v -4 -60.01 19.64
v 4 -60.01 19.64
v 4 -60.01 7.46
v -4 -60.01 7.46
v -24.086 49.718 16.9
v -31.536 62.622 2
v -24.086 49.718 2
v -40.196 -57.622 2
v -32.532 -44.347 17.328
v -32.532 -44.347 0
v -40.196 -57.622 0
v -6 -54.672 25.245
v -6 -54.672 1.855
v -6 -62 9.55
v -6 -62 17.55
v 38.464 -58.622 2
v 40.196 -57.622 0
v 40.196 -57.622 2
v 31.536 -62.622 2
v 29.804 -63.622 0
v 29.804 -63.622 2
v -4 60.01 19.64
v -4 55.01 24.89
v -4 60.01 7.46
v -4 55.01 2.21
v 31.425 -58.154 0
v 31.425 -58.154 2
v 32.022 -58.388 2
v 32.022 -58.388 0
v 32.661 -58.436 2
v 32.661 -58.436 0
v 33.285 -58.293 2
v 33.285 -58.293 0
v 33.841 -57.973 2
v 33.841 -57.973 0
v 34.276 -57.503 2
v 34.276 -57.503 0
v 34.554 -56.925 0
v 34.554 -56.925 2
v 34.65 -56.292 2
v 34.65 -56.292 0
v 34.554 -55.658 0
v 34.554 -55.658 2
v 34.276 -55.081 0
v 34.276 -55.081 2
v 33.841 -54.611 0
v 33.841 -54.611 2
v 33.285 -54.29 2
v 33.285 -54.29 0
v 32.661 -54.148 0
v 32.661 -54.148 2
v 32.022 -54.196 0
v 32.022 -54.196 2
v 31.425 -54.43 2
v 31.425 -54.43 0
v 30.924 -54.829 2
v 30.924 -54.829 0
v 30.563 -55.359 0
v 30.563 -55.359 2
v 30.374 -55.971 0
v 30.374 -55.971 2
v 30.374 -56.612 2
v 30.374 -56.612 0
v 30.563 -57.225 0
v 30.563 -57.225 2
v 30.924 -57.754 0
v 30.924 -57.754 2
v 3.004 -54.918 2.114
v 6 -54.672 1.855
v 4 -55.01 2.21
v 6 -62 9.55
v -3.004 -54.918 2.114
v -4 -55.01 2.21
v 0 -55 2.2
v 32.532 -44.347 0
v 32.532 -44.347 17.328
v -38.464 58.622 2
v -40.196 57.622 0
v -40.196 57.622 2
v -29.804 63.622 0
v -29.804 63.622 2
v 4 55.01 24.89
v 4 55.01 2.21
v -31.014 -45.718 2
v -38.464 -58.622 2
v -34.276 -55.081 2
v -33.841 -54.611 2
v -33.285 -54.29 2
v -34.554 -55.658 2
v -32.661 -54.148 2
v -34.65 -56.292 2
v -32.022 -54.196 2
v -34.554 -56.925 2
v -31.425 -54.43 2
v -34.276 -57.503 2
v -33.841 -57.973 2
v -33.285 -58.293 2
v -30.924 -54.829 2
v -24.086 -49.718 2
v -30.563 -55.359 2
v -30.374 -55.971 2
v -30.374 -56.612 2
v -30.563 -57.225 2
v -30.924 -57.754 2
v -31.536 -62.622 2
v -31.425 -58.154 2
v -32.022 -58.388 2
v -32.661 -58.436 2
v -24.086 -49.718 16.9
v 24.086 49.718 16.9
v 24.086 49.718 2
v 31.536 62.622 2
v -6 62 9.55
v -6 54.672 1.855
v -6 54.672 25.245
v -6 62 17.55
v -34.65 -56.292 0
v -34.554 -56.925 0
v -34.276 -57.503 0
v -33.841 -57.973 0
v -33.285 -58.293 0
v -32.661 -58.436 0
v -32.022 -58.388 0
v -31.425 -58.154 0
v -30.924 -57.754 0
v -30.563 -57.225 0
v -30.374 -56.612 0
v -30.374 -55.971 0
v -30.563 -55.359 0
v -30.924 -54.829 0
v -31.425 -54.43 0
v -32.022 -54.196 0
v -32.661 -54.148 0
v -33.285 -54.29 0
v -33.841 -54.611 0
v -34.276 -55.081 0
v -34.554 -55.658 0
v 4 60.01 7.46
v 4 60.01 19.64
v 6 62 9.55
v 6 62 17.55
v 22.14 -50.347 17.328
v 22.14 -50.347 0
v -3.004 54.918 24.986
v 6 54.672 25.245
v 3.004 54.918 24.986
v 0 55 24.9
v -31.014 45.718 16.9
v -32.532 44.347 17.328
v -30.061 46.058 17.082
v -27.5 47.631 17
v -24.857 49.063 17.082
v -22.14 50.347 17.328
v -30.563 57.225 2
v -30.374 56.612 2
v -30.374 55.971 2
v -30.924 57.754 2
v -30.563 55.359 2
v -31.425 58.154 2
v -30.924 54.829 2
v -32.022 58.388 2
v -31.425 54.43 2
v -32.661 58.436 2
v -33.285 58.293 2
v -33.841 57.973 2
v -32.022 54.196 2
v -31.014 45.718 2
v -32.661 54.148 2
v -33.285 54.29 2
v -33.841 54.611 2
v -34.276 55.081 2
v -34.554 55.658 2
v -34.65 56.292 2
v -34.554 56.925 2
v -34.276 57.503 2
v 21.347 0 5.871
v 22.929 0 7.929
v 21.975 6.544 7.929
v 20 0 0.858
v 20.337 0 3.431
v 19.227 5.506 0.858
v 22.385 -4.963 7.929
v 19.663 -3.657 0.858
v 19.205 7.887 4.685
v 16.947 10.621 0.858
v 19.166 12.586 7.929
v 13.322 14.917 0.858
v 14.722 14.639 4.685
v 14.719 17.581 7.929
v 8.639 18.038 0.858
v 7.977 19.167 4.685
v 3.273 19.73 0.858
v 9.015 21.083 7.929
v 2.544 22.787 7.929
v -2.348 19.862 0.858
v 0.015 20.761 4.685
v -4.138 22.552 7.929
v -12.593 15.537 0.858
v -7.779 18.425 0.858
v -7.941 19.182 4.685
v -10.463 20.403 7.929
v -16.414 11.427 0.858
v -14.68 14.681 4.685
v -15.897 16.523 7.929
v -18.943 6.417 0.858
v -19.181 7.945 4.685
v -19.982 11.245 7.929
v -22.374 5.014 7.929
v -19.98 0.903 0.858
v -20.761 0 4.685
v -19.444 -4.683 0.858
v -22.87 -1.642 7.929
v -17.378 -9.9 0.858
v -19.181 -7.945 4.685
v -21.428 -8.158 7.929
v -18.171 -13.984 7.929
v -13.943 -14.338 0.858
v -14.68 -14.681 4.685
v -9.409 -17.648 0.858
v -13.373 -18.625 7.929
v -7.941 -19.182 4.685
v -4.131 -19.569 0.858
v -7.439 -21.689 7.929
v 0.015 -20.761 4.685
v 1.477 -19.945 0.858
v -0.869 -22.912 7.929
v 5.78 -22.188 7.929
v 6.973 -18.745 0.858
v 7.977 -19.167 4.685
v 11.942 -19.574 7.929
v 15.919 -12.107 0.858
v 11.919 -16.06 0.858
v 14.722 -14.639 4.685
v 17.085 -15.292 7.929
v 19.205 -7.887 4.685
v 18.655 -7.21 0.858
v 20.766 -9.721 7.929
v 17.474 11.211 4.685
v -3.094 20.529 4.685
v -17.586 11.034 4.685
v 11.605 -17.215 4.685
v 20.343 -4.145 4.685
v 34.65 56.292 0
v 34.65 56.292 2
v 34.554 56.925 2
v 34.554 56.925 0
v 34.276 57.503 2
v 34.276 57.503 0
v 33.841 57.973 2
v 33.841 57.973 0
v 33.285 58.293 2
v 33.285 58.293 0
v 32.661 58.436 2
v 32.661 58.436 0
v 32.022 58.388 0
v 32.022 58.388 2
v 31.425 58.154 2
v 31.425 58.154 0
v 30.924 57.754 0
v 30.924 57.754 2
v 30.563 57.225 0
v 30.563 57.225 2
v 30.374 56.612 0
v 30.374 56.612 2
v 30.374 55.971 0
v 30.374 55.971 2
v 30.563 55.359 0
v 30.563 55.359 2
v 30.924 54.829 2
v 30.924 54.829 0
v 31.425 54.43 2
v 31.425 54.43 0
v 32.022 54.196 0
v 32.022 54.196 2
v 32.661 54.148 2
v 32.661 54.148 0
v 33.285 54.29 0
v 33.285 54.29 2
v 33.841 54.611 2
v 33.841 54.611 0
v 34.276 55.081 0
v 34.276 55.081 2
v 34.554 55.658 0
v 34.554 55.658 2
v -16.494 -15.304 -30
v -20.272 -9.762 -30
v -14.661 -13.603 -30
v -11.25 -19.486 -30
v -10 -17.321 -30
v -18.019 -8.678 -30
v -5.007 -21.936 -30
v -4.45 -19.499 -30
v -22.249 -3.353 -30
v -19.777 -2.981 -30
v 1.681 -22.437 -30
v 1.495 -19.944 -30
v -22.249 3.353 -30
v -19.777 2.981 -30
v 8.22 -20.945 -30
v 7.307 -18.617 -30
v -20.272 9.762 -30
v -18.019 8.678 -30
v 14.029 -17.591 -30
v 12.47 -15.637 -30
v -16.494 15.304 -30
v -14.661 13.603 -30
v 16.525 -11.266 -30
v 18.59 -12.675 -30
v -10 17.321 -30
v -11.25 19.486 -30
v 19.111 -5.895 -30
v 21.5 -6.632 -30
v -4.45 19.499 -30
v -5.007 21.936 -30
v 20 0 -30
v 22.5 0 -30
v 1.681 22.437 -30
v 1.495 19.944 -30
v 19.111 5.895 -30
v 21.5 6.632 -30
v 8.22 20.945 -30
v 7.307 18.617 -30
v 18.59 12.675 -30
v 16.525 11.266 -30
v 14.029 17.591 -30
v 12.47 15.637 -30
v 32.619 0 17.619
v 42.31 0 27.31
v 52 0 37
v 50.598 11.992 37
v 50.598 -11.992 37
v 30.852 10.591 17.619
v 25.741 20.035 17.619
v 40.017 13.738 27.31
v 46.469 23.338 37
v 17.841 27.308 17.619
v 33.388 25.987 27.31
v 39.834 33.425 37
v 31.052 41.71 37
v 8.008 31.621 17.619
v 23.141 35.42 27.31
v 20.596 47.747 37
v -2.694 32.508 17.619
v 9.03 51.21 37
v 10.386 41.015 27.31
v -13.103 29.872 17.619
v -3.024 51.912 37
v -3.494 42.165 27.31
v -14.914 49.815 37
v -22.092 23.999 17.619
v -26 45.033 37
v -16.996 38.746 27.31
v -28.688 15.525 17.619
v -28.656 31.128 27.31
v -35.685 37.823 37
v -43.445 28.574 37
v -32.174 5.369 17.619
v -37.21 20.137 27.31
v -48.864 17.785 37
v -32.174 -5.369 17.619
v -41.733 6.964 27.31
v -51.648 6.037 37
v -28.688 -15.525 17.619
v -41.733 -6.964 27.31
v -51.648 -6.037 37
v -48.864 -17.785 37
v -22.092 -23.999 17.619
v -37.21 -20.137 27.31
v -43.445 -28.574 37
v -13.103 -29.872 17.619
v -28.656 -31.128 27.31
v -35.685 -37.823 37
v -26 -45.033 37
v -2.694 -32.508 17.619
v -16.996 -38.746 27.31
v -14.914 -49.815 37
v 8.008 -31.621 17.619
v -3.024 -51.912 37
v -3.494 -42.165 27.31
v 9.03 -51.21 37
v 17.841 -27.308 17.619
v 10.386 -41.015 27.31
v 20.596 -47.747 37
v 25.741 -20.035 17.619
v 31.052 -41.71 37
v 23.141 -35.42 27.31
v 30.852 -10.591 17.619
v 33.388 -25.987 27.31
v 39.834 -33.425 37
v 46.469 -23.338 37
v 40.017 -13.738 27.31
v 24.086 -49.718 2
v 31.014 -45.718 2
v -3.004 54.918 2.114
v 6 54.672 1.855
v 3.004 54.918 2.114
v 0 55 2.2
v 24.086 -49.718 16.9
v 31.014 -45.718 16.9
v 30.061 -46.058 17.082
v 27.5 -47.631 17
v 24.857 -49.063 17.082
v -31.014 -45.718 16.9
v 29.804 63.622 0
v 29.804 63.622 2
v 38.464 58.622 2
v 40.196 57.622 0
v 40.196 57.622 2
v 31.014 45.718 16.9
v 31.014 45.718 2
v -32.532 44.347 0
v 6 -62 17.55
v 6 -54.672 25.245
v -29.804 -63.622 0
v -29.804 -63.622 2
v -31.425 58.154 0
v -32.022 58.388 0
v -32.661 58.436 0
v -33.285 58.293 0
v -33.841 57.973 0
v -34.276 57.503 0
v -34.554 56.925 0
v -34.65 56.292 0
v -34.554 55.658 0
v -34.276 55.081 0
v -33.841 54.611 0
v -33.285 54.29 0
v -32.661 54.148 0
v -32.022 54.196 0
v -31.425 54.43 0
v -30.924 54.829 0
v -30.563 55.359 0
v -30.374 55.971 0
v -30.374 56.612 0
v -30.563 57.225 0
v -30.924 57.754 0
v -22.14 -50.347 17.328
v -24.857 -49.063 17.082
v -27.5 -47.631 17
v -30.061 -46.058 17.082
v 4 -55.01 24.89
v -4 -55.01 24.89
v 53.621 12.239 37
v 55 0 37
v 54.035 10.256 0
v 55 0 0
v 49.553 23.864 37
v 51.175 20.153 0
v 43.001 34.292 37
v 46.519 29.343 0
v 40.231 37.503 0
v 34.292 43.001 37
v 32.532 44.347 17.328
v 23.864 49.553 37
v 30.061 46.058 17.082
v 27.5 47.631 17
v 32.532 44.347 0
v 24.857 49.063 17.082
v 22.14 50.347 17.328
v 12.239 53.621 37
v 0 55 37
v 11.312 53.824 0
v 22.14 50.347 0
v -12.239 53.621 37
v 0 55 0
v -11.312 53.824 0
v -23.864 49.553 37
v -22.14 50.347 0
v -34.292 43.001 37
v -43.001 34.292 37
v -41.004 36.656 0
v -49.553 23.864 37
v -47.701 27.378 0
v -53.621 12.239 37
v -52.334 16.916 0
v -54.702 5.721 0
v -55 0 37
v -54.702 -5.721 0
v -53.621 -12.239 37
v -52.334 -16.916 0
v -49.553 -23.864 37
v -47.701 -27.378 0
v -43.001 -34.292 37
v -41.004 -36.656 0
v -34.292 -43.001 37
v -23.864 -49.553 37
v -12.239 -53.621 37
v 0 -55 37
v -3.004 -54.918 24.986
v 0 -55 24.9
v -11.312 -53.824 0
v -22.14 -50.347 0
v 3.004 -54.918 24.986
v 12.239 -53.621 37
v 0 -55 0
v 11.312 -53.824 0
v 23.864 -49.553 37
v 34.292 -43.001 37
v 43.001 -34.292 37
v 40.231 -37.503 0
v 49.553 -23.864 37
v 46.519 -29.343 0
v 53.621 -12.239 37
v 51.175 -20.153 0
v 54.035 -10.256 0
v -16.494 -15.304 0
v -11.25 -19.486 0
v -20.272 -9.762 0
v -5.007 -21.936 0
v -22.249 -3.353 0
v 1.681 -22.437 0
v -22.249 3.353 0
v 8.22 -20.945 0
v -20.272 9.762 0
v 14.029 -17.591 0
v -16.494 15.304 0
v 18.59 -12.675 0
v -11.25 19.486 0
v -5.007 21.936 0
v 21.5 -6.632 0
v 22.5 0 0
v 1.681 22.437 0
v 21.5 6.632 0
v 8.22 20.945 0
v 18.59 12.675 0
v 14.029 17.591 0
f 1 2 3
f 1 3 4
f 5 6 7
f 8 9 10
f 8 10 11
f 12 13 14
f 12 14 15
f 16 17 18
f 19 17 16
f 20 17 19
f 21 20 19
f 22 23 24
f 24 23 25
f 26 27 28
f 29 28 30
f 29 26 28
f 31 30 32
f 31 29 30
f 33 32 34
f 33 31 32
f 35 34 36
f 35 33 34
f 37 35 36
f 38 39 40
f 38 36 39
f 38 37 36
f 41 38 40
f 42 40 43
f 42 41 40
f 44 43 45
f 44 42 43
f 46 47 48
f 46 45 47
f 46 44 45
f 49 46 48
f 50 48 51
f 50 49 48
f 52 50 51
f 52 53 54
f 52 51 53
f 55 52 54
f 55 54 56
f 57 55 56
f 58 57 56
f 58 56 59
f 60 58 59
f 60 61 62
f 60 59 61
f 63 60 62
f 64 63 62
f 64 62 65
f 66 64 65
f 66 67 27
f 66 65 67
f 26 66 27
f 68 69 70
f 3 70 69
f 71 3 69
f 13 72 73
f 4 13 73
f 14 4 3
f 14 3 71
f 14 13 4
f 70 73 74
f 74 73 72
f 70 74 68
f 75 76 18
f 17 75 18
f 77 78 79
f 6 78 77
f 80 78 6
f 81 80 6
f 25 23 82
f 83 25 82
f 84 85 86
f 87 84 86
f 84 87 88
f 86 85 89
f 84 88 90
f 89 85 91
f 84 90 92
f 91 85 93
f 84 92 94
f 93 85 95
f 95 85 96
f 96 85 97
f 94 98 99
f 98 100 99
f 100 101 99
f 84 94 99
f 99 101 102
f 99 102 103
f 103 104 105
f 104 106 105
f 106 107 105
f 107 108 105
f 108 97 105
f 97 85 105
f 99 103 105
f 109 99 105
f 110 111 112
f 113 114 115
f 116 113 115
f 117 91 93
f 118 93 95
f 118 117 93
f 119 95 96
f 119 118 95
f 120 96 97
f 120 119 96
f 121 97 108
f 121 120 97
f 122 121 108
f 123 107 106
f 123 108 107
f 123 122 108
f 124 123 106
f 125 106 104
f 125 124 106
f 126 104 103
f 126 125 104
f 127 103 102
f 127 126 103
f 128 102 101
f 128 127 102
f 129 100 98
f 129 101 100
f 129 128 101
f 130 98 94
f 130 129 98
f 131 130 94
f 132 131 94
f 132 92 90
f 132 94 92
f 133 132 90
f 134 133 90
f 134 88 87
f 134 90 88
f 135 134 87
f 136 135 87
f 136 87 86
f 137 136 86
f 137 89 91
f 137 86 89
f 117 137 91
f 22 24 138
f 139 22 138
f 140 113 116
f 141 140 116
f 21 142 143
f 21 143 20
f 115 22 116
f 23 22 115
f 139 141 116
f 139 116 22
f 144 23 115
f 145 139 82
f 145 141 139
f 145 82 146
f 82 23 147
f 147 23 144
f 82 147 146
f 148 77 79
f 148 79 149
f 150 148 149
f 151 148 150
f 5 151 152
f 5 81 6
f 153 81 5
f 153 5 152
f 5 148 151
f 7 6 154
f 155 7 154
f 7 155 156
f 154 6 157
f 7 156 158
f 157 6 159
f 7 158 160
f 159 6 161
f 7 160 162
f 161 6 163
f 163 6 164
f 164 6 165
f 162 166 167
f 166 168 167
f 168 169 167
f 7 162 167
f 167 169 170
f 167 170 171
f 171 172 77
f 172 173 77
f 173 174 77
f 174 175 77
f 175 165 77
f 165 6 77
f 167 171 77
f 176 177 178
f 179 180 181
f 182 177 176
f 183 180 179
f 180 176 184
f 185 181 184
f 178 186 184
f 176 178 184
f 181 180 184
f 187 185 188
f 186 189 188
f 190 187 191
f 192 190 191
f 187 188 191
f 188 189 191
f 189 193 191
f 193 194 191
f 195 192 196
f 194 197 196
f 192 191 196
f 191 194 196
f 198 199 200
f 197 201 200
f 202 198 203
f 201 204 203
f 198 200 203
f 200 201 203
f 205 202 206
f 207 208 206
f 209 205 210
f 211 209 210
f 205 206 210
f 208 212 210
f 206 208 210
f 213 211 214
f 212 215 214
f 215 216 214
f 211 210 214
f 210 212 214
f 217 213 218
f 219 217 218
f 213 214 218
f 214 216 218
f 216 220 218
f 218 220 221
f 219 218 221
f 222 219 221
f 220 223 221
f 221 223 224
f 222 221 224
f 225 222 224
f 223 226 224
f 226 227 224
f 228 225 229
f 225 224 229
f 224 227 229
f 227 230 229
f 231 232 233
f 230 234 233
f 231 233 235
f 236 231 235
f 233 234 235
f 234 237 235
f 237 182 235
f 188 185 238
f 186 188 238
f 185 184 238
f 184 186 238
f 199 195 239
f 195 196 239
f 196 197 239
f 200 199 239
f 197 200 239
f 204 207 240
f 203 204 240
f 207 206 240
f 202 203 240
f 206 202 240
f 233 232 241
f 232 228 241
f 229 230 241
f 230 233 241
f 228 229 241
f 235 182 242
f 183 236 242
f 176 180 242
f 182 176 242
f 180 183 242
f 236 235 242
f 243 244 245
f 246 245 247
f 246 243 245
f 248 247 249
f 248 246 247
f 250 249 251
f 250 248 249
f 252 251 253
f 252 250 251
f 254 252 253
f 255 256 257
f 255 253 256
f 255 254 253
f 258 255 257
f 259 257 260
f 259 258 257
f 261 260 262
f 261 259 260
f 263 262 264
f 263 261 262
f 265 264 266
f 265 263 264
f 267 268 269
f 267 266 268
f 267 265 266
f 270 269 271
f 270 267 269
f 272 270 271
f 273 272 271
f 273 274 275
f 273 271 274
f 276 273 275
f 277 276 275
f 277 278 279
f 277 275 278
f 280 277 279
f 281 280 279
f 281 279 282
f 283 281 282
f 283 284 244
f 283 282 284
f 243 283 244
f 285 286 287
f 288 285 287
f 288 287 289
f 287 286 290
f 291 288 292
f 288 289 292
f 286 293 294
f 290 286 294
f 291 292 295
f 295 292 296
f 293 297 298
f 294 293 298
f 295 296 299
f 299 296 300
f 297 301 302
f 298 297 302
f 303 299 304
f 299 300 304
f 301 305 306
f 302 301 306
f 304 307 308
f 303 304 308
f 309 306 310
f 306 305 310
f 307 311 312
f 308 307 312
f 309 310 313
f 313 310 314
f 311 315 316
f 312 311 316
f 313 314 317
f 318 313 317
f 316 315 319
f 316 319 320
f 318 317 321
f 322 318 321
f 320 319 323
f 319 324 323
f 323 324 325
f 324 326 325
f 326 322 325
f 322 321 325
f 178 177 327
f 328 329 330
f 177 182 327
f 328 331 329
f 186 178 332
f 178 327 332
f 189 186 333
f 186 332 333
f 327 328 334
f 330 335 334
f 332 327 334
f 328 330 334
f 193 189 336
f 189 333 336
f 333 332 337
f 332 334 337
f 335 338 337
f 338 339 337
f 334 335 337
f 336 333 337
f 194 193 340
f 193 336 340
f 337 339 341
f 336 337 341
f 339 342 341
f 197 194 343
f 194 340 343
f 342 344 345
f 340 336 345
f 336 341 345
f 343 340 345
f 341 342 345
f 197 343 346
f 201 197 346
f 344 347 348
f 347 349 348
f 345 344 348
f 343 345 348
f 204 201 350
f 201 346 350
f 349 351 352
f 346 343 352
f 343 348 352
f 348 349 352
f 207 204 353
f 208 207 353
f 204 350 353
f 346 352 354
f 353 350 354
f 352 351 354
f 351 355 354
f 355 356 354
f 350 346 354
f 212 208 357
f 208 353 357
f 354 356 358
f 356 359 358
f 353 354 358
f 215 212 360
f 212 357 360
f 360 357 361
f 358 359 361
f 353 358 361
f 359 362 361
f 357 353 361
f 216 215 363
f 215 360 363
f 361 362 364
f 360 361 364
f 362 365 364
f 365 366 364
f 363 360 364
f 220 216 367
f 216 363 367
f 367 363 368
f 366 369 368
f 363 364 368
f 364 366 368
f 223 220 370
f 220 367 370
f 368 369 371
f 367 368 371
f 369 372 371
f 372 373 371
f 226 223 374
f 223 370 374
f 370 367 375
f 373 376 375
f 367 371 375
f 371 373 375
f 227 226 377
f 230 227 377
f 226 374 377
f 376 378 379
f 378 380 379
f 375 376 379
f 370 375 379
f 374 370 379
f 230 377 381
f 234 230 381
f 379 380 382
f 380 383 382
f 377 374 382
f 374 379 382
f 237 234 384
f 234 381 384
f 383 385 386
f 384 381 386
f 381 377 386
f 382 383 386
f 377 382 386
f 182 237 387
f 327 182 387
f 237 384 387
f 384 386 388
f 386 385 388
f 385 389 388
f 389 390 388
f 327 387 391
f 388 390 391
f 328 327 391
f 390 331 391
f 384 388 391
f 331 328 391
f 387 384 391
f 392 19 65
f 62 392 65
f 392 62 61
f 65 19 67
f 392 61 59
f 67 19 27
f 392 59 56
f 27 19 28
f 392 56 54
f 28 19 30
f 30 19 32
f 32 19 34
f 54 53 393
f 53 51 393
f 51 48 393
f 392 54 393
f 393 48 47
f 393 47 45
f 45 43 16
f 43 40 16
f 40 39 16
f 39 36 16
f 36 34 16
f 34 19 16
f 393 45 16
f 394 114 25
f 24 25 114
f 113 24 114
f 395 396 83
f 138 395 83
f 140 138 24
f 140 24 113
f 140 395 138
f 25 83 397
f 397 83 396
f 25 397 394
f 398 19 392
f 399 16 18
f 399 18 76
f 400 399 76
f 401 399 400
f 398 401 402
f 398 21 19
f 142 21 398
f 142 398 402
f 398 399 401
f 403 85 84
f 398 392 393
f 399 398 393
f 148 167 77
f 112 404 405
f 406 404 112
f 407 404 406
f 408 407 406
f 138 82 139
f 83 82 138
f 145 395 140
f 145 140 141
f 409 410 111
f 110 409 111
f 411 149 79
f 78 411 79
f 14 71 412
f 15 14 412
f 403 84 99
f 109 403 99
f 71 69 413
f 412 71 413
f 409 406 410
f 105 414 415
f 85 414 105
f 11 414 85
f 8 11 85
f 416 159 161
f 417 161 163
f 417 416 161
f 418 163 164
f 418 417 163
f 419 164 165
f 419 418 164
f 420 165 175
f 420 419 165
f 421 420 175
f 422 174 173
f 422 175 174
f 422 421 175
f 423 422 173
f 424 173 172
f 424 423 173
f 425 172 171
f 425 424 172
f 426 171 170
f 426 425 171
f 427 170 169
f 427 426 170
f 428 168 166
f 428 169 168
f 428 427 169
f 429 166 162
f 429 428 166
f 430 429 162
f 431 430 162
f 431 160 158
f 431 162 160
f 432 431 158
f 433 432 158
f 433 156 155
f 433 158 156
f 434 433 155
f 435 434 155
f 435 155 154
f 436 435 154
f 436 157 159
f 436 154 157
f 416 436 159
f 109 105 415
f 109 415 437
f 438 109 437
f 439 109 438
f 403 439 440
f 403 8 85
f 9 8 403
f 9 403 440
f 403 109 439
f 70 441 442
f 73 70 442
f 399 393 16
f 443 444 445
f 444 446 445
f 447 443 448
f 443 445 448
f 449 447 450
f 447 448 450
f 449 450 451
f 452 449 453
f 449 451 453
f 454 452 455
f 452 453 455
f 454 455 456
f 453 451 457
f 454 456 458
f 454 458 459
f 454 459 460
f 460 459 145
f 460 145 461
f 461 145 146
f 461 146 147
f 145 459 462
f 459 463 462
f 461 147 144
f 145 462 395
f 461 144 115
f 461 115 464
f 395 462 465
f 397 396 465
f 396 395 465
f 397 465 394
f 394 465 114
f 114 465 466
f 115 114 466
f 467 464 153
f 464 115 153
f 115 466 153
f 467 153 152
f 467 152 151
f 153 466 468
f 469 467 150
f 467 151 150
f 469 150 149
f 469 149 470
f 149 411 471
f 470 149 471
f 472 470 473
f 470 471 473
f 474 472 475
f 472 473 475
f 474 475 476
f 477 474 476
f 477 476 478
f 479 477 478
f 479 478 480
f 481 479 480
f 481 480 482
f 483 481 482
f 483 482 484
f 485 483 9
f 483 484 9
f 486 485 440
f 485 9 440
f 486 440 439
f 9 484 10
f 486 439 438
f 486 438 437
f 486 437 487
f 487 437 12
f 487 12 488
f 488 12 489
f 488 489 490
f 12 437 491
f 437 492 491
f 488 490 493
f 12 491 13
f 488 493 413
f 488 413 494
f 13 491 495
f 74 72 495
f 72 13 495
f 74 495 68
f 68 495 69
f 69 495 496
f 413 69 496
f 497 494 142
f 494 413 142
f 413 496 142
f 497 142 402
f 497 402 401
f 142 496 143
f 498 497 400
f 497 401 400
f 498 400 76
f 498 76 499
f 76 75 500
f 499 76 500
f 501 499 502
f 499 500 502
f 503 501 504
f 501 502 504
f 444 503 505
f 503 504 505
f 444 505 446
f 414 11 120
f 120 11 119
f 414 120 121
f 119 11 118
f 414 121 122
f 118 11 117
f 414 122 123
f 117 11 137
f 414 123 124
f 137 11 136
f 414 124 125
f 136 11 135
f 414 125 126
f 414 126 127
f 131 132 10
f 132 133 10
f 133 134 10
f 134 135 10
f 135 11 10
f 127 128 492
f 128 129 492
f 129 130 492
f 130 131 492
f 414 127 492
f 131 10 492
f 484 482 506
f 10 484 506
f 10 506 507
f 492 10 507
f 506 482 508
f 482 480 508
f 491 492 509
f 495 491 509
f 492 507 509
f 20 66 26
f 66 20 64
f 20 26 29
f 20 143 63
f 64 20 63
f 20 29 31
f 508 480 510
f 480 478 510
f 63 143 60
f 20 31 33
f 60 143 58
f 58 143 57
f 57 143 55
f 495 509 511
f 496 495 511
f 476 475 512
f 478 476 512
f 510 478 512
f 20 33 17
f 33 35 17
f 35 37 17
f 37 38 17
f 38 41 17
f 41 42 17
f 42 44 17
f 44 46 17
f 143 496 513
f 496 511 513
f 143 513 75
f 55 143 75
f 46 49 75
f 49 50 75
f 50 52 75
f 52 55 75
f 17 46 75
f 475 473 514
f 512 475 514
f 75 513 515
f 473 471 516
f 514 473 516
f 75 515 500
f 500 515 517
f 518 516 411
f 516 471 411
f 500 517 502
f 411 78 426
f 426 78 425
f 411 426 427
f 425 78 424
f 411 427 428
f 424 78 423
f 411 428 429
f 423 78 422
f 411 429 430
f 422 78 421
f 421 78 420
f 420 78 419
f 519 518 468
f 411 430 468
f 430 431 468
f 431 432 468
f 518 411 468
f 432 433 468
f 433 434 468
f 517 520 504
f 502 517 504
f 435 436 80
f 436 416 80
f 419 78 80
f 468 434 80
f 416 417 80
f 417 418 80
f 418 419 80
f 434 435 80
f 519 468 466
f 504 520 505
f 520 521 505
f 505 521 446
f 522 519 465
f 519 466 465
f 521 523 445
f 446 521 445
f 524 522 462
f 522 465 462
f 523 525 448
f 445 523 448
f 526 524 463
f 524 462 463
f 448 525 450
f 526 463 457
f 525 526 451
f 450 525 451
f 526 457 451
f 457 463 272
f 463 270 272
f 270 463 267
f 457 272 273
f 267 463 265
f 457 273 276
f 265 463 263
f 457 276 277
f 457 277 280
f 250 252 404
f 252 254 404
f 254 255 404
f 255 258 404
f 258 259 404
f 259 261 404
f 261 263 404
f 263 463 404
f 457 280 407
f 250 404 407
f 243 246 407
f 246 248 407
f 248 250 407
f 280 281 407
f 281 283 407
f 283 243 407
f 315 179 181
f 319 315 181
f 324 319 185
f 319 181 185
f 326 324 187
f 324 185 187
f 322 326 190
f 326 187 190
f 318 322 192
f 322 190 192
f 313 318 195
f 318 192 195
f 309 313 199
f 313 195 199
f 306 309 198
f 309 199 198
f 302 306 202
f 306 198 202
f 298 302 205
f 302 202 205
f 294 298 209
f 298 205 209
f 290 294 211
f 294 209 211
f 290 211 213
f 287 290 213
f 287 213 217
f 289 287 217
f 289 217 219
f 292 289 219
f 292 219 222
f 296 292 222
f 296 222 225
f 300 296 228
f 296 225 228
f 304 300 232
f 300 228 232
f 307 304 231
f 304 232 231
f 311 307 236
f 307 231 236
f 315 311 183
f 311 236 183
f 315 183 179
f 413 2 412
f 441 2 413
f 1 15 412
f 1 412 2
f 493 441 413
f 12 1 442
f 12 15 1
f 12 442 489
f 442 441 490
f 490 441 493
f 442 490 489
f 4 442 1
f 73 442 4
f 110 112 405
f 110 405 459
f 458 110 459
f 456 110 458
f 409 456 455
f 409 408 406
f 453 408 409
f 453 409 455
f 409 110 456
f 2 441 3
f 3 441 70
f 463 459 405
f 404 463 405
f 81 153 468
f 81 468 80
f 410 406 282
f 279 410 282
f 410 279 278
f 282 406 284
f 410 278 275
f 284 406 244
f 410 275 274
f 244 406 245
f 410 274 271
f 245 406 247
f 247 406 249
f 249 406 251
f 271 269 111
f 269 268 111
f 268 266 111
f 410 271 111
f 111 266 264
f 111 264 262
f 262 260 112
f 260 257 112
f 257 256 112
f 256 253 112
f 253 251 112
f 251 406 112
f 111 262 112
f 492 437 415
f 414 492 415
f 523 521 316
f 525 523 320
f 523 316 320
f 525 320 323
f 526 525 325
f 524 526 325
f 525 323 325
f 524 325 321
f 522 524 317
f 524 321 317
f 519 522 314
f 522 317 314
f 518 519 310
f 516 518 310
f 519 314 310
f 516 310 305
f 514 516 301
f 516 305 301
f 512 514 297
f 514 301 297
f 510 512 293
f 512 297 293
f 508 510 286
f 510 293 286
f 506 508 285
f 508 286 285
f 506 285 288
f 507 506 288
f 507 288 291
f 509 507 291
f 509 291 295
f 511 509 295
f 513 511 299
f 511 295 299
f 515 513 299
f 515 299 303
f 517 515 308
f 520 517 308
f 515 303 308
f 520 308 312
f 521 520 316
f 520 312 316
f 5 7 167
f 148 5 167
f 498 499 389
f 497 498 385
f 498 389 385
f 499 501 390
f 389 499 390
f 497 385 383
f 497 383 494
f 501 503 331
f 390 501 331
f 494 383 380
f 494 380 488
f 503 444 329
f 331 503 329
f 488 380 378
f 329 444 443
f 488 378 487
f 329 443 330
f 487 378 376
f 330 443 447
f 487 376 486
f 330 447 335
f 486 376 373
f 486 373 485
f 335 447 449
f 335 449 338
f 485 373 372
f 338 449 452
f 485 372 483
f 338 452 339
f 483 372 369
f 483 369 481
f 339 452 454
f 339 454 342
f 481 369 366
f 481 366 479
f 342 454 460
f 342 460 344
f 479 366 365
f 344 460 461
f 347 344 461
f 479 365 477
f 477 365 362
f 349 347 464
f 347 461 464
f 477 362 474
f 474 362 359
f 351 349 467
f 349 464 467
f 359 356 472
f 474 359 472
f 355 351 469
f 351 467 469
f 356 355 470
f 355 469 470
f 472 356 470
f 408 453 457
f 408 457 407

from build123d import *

# Parameters (mm, degrees)
PAD_DEPTH             = 6
SKETCH003_W           = 8
SKETCH003_H           = 5
POCKET_DEPTH          = 385.012494
POLARPATTERN001_COUNT = 2
PAD001_DEPTH          = 6
POCKET001_DEPTH       = 394.833356
SKETCH006_R           = 2.15
POCKET002_DEPTH       = 396.833356
POLARPATTERN002_COUNT = 2
POLARPATTERN002_ANGLE = 60
POLARPATTERN003_COUNT = 2
POLARPATTERN004_COUNT = 2
POLARPATTERN004_ANGLE = 240
FILLET_R              = 10


with BuildPart() as part:
    # Sketch → Revolution (revolve)
    with BuildSketch(Plane.XZ):
        Polygon((55, 37), (55, 0), (22.5, 0), (22.5, -30), (20, -30), (20, 5), (52, 37), align=None)
    revolve(axis=Axis((0, 0, 0), (0, 0, 1)))

    # Sketch002 (on DatumPlane) → Pad (new body, symmetric)
    with BuildSketch(Plane.YZ):
        Polygon((53, 0.1), (62, 9.55), (62, 17.55), (53, 27), align=None)
    pad = extrude(amount=PAD_DEPTH, both=True)

    # Sketch003 → Pocket (cut, through all)
    with BuildSketch(Plane.XY):
        with Locations((0, 57.51)):
            Rectangle(SKETCH003_W, SKETCH003_H)
    pocket = extrude(amount=POCKET_DEPTH, mode=Mode.SUBTRACT)

    # PolarPattern001: Pad, Pocket ×2 about axis
    polarpattern001_axis = Axis((0, 0, 0), (0, 0, 1))
    for i in range(1, POLARPATTERN001_COUNT):
        add(pad.rotate(polarpattern001_axis, i * 360 / POLARPATTERN001_COUNT))
        add(pocket.rotate(polarpattern001_axis, i * 360 / POLARPATTERN001_COUNT), mode=Mode.SUBTRACT)

    # Sketch004 (on DatumPlane) → Pad001 (join, symmetric)
    with BuildSketch(Plane(origin=(0, 0, 0), x_dir=(0.5, 0.866025, 0), z_dir=(0.866025, -0.5, 0))):
        Polygon((52, 0), (70, 0), (70, 2), (52, 20), align=None)
    pad001 = extrude(amount=PAD001_DEPTH, both=True)

    # Sketch005 → Pocket001 (cut, through all)
    with BuildSketch(Plane.XY.offset(2)):
        Polygon((32.035898, 63.487804), (38.964102, 59.487804), (31.014102, 45.718), (24.085898, 49.718), align=None)
    pocket001 = extrude(amount=POCKET001_DEPTH, mode=Mode.SUBTRACT)

    # Sketch006 → Pocket002 (cut, through all)
    with BuildSketch(Plane.XY):
        with Locations((32.5, 56.291651)):
            Circle(SKETCH006_R)
    pocket002 = extrude(amount=POCKET002_DEPTH, mode=Mode.SUBTRACT)

    # PolarPattern002: Pad001, Pocket001, Pocket002 ×2 about axis
    polarpattern002_axis = Axis((0, 0, 0), (0, 0, 1))
    for i in range(1, POLARPATTERN002_COUNT):
        add(pad001.rotate(polarpattern002_axis, i * POLARPATTERN002_ANGLE / (POLARPATTERN002_COUNT - 1)))
        add(pocket001.rotate(polarpattern002_axis, i * POLARPATTERN002_ANGLE / (POLARPATTERN002_COUNT - 1)), mode=Mode.SUBTRACT)
        add(pocket002.rotate(polarpattern002_axis, i * POLARPATTERN002_ANGLE / (POLARPATTERN002_COUNT - 1)), mode=Mode.SUBTRACT)

    # PolarPattern003: Pad001, Pocket001, Pocket002 ×2 about axis
    polarpattern003_axis = Axis((0, 0, 0), (0, 0, 1))
    for i in range(1, POLARPATTERN003_COUNT):
        add(pad001.rotate(polarpattern003_axis, i * 360 / POLARPATTERN003_COUNT))
        add(pocket001.rotate(polarpattern003_axis, i * 360 / POLARPATTERN003_COUNT), mode=Mode.SUBTRACT)
        add(pocket002.rotate(polarpattern003_axis, i * 360 / POLARPATTERN003_COUNT), mode=Mode.SUBTRACT)

    # PolarPattern004: Pad001, Pocket001, Pocket002 ×2 about axis
    polarpattern004_axis = Axis((0, 0, 0), (0, 0, 1))
    for i in range(1, POLARPATTERN004_COUNT):
        add(pad001.rotate(polarpattern004_axis, i * POLARPATTERN004_ANGLE / (POLARPATTERN004_COUNT - 1)))
        add(pocket001.rotate(polarpattern004_axis, i * POLARPATTERN004_ANGLE / (POLARPATTERN004_COUNT - 1)), mode=Mode.SUBTRACT)
        add(pocket002.rotate(polarpattern004_axis, i * POLARPATTERN004_ANGLE / (POLARPATTERN004_COUNT - 1)), mode=Mode.SUBTRACT)

    # Fillet
    fillet_edges = [part.edges().sort_by_distance(p)[0] for p in [
        (-20, 0, 5),
    ]]
    fillet(fillet_edges, radius=FILLET_R)


solid = part.part
